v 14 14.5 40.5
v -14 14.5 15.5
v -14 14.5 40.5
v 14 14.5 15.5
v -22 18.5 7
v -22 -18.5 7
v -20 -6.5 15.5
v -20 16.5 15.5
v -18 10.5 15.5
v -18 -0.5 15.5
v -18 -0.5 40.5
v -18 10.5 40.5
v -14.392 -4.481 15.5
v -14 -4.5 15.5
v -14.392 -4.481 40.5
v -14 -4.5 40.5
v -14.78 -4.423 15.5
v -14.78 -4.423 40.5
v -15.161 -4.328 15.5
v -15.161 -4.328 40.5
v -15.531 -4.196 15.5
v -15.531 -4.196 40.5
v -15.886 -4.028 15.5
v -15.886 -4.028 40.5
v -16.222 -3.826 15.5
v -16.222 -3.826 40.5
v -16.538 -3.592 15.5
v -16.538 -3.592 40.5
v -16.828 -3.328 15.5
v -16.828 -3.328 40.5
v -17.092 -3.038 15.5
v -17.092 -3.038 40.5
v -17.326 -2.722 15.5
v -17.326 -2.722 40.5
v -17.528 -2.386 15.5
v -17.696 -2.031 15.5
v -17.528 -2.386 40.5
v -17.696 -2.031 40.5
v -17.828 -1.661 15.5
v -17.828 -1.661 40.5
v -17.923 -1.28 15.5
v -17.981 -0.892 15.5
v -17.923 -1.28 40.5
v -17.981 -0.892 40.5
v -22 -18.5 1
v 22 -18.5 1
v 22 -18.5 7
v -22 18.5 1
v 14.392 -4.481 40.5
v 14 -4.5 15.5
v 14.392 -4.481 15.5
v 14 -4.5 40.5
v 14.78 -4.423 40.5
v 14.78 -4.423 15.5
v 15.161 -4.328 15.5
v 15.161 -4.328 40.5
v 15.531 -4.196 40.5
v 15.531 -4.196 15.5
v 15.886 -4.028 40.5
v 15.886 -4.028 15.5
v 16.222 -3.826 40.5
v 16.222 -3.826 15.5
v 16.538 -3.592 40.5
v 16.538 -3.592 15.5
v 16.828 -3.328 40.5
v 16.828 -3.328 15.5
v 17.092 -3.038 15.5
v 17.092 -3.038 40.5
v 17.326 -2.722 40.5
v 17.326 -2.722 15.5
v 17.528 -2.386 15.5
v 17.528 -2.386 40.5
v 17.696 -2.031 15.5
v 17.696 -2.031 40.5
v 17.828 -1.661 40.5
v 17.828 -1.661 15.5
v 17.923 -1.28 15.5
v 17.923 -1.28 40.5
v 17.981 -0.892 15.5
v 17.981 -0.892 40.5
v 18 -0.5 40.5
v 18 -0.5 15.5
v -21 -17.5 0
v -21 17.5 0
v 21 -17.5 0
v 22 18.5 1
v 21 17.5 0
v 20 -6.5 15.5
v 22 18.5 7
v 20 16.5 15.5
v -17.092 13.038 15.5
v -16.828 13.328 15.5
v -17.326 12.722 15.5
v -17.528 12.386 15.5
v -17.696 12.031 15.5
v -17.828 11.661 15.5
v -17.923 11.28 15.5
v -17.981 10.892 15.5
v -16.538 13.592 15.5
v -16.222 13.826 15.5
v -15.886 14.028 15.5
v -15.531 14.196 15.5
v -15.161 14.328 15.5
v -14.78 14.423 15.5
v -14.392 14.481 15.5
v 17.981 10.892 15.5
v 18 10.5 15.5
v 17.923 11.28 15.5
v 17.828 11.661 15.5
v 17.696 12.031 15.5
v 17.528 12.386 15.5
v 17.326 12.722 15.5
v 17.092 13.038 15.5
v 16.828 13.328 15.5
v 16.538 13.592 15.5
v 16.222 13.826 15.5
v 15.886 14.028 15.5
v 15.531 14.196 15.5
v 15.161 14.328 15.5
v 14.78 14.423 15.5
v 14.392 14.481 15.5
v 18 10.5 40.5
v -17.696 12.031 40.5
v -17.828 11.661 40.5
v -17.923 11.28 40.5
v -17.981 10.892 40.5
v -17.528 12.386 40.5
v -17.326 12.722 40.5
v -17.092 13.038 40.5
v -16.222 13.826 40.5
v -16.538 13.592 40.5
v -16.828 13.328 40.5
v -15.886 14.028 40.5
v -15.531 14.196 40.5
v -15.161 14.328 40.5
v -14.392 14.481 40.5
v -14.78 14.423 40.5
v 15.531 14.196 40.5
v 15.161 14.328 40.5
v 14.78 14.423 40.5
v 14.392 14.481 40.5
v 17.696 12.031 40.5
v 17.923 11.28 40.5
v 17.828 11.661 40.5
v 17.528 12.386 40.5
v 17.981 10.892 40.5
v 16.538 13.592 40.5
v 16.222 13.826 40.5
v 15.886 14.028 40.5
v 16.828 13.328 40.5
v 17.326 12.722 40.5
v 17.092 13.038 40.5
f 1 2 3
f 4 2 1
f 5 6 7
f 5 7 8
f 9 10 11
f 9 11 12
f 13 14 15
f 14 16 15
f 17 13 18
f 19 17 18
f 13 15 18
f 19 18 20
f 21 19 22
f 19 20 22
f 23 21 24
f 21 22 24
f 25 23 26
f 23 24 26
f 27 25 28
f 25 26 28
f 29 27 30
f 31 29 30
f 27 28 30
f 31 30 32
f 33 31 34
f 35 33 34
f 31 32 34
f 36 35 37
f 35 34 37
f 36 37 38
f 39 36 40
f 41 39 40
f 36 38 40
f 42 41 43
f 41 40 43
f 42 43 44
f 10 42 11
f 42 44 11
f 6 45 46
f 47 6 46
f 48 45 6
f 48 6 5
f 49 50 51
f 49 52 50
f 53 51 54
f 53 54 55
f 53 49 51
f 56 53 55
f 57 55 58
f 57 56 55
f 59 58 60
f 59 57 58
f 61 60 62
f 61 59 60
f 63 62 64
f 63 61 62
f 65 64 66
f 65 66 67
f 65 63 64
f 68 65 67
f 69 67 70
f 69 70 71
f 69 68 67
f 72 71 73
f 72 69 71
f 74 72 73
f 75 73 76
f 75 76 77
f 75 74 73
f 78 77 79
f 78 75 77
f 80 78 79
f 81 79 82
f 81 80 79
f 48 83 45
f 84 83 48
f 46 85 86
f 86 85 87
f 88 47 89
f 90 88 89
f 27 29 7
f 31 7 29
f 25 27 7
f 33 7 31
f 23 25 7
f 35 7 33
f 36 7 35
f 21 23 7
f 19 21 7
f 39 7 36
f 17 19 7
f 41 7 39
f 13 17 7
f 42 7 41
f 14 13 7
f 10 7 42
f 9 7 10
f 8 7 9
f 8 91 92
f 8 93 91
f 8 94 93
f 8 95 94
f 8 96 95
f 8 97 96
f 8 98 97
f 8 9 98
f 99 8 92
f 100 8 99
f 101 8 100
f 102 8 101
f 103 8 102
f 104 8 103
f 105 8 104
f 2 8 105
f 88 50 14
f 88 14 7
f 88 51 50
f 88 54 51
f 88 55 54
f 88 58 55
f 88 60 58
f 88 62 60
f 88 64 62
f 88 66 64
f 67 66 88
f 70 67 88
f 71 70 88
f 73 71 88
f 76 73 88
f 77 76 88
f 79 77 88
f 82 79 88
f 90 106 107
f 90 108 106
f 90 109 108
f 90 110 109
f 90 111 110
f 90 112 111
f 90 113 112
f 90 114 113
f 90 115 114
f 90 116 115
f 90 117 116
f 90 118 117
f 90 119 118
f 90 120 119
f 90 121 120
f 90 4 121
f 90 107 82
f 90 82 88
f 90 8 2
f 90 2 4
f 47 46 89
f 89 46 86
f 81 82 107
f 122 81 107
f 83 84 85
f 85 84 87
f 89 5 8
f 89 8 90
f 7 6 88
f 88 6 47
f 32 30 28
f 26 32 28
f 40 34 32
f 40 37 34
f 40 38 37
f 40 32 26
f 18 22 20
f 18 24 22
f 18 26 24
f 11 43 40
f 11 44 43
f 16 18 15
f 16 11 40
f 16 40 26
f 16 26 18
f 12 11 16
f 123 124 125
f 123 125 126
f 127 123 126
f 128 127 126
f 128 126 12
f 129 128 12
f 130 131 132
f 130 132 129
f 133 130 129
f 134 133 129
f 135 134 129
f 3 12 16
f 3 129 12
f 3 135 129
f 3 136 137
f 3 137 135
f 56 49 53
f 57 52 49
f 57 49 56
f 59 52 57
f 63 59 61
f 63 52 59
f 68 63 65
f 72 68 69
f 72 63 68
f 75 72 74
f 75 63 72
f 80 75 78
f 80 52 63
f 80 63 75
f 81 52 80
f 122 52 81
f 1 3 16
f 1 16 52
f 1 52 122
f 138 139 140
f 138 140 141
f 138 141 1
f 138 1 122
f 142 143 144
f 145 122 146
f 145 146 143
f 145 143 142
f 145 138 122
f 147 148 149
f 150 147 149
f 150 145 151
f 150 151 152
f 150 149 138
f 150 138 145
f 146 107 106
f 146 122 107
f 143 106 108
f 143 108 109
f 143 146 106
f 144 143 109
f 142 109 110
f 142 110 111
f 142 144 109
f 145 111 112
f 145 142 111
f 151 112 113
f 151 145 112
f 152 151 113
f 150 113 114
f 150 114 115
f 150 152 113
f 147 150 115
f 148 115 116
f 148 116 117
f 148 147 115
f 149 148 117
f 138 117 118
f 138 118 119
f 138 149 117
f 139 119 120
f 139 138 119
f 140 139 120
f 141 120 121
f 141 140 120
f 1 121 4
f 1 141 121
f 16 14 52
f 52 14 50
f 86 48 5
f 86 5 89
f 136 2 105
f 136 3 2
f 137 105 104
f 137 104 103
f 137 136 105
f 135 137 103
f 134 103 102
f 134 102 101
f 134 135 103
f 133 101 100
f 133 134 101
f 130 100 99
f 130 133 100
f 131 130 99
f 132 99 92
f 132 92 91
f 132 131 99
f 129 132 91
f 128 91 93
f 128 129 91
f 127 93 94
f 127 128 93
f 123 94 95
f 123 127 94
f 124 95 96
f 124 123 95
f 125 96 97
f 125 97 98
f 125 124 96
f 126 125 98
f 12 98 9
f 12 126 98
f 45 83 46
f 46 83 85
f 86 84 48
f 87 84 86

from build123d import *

# Parameters (mm, degrees)
F0_W     = 44
F0_H     = 37
F1_DEPTH = 15.5
F2_SIZE2 = 8.5
F2_SIZE  = 12
F3_SIZE2 = 8.5
F3_SIZE  = 2
F4_W     = 36
F4_H     = 19
F5_DEPTH = 25
F6_R     = 4
F7_SIZE  = 1


with BuildPart() as f1:
    # F0 (on Top) → F1 (new body)
    with BuildSketch(Plane.XY):
        Rectangle(F0_W, F0_H)
    extrude(amount=F1_DEPTH)

    # F2
    f2_edges = [f1.edges().sort_by_distance(p)[0] for p in [
        (0, -18.5, 15.5),
    ]]
    f2_side = f1.faces().sort_by_distance((0, 0, 15.5))[0]
    chamfer(f2_edges, length=F2_SIZE, length2=F2_SIZE2, reference=f2_side)

    # F3
    f3_edges = [f1.edges().sort_by_distance(p)[0] for p in [
        (-22, 6, 15.5),
        (22, 6, 15.5),
        (0, 18.5, 15.5),
    ]]
    f3_side = f1.faces().sort_by_distance((0, 6, 15.5))[0]
    chamfer(f3_edges, length=F3_SIZE, length2=F3_SIZE2, reference=f3_side)

    # F4 (on face) → F5 (join)
    with BuildSketch(Plane.XY.offset(15.5)):
        with Locations((0, 5)):
            Rectangle(F4_W, F4_H)
    extrude(amount=F5_DEPTH)

    # F6
    f6_edges = [f1.edges().sort_by_distance(p)[0] for p in [
        (-18, -4.5, 28),
        (-18, 14.5, 28),
        (18, -4.5, 28),
        (18, 14.5, 28),
    ]]
    fillet(f6_edges, radius=F6_R)

    # F7
    f7_edges = [f1.edges().sort_by_distance(p)[0] for p in [
        (-22, 0, 0),
        (0, 18.5, 0),
        (22, 0, 0),
        (0, -18.5, 0),
    ]]
    chamfer(f7_edges, length=F7_SIZE)


solid = f1.part
